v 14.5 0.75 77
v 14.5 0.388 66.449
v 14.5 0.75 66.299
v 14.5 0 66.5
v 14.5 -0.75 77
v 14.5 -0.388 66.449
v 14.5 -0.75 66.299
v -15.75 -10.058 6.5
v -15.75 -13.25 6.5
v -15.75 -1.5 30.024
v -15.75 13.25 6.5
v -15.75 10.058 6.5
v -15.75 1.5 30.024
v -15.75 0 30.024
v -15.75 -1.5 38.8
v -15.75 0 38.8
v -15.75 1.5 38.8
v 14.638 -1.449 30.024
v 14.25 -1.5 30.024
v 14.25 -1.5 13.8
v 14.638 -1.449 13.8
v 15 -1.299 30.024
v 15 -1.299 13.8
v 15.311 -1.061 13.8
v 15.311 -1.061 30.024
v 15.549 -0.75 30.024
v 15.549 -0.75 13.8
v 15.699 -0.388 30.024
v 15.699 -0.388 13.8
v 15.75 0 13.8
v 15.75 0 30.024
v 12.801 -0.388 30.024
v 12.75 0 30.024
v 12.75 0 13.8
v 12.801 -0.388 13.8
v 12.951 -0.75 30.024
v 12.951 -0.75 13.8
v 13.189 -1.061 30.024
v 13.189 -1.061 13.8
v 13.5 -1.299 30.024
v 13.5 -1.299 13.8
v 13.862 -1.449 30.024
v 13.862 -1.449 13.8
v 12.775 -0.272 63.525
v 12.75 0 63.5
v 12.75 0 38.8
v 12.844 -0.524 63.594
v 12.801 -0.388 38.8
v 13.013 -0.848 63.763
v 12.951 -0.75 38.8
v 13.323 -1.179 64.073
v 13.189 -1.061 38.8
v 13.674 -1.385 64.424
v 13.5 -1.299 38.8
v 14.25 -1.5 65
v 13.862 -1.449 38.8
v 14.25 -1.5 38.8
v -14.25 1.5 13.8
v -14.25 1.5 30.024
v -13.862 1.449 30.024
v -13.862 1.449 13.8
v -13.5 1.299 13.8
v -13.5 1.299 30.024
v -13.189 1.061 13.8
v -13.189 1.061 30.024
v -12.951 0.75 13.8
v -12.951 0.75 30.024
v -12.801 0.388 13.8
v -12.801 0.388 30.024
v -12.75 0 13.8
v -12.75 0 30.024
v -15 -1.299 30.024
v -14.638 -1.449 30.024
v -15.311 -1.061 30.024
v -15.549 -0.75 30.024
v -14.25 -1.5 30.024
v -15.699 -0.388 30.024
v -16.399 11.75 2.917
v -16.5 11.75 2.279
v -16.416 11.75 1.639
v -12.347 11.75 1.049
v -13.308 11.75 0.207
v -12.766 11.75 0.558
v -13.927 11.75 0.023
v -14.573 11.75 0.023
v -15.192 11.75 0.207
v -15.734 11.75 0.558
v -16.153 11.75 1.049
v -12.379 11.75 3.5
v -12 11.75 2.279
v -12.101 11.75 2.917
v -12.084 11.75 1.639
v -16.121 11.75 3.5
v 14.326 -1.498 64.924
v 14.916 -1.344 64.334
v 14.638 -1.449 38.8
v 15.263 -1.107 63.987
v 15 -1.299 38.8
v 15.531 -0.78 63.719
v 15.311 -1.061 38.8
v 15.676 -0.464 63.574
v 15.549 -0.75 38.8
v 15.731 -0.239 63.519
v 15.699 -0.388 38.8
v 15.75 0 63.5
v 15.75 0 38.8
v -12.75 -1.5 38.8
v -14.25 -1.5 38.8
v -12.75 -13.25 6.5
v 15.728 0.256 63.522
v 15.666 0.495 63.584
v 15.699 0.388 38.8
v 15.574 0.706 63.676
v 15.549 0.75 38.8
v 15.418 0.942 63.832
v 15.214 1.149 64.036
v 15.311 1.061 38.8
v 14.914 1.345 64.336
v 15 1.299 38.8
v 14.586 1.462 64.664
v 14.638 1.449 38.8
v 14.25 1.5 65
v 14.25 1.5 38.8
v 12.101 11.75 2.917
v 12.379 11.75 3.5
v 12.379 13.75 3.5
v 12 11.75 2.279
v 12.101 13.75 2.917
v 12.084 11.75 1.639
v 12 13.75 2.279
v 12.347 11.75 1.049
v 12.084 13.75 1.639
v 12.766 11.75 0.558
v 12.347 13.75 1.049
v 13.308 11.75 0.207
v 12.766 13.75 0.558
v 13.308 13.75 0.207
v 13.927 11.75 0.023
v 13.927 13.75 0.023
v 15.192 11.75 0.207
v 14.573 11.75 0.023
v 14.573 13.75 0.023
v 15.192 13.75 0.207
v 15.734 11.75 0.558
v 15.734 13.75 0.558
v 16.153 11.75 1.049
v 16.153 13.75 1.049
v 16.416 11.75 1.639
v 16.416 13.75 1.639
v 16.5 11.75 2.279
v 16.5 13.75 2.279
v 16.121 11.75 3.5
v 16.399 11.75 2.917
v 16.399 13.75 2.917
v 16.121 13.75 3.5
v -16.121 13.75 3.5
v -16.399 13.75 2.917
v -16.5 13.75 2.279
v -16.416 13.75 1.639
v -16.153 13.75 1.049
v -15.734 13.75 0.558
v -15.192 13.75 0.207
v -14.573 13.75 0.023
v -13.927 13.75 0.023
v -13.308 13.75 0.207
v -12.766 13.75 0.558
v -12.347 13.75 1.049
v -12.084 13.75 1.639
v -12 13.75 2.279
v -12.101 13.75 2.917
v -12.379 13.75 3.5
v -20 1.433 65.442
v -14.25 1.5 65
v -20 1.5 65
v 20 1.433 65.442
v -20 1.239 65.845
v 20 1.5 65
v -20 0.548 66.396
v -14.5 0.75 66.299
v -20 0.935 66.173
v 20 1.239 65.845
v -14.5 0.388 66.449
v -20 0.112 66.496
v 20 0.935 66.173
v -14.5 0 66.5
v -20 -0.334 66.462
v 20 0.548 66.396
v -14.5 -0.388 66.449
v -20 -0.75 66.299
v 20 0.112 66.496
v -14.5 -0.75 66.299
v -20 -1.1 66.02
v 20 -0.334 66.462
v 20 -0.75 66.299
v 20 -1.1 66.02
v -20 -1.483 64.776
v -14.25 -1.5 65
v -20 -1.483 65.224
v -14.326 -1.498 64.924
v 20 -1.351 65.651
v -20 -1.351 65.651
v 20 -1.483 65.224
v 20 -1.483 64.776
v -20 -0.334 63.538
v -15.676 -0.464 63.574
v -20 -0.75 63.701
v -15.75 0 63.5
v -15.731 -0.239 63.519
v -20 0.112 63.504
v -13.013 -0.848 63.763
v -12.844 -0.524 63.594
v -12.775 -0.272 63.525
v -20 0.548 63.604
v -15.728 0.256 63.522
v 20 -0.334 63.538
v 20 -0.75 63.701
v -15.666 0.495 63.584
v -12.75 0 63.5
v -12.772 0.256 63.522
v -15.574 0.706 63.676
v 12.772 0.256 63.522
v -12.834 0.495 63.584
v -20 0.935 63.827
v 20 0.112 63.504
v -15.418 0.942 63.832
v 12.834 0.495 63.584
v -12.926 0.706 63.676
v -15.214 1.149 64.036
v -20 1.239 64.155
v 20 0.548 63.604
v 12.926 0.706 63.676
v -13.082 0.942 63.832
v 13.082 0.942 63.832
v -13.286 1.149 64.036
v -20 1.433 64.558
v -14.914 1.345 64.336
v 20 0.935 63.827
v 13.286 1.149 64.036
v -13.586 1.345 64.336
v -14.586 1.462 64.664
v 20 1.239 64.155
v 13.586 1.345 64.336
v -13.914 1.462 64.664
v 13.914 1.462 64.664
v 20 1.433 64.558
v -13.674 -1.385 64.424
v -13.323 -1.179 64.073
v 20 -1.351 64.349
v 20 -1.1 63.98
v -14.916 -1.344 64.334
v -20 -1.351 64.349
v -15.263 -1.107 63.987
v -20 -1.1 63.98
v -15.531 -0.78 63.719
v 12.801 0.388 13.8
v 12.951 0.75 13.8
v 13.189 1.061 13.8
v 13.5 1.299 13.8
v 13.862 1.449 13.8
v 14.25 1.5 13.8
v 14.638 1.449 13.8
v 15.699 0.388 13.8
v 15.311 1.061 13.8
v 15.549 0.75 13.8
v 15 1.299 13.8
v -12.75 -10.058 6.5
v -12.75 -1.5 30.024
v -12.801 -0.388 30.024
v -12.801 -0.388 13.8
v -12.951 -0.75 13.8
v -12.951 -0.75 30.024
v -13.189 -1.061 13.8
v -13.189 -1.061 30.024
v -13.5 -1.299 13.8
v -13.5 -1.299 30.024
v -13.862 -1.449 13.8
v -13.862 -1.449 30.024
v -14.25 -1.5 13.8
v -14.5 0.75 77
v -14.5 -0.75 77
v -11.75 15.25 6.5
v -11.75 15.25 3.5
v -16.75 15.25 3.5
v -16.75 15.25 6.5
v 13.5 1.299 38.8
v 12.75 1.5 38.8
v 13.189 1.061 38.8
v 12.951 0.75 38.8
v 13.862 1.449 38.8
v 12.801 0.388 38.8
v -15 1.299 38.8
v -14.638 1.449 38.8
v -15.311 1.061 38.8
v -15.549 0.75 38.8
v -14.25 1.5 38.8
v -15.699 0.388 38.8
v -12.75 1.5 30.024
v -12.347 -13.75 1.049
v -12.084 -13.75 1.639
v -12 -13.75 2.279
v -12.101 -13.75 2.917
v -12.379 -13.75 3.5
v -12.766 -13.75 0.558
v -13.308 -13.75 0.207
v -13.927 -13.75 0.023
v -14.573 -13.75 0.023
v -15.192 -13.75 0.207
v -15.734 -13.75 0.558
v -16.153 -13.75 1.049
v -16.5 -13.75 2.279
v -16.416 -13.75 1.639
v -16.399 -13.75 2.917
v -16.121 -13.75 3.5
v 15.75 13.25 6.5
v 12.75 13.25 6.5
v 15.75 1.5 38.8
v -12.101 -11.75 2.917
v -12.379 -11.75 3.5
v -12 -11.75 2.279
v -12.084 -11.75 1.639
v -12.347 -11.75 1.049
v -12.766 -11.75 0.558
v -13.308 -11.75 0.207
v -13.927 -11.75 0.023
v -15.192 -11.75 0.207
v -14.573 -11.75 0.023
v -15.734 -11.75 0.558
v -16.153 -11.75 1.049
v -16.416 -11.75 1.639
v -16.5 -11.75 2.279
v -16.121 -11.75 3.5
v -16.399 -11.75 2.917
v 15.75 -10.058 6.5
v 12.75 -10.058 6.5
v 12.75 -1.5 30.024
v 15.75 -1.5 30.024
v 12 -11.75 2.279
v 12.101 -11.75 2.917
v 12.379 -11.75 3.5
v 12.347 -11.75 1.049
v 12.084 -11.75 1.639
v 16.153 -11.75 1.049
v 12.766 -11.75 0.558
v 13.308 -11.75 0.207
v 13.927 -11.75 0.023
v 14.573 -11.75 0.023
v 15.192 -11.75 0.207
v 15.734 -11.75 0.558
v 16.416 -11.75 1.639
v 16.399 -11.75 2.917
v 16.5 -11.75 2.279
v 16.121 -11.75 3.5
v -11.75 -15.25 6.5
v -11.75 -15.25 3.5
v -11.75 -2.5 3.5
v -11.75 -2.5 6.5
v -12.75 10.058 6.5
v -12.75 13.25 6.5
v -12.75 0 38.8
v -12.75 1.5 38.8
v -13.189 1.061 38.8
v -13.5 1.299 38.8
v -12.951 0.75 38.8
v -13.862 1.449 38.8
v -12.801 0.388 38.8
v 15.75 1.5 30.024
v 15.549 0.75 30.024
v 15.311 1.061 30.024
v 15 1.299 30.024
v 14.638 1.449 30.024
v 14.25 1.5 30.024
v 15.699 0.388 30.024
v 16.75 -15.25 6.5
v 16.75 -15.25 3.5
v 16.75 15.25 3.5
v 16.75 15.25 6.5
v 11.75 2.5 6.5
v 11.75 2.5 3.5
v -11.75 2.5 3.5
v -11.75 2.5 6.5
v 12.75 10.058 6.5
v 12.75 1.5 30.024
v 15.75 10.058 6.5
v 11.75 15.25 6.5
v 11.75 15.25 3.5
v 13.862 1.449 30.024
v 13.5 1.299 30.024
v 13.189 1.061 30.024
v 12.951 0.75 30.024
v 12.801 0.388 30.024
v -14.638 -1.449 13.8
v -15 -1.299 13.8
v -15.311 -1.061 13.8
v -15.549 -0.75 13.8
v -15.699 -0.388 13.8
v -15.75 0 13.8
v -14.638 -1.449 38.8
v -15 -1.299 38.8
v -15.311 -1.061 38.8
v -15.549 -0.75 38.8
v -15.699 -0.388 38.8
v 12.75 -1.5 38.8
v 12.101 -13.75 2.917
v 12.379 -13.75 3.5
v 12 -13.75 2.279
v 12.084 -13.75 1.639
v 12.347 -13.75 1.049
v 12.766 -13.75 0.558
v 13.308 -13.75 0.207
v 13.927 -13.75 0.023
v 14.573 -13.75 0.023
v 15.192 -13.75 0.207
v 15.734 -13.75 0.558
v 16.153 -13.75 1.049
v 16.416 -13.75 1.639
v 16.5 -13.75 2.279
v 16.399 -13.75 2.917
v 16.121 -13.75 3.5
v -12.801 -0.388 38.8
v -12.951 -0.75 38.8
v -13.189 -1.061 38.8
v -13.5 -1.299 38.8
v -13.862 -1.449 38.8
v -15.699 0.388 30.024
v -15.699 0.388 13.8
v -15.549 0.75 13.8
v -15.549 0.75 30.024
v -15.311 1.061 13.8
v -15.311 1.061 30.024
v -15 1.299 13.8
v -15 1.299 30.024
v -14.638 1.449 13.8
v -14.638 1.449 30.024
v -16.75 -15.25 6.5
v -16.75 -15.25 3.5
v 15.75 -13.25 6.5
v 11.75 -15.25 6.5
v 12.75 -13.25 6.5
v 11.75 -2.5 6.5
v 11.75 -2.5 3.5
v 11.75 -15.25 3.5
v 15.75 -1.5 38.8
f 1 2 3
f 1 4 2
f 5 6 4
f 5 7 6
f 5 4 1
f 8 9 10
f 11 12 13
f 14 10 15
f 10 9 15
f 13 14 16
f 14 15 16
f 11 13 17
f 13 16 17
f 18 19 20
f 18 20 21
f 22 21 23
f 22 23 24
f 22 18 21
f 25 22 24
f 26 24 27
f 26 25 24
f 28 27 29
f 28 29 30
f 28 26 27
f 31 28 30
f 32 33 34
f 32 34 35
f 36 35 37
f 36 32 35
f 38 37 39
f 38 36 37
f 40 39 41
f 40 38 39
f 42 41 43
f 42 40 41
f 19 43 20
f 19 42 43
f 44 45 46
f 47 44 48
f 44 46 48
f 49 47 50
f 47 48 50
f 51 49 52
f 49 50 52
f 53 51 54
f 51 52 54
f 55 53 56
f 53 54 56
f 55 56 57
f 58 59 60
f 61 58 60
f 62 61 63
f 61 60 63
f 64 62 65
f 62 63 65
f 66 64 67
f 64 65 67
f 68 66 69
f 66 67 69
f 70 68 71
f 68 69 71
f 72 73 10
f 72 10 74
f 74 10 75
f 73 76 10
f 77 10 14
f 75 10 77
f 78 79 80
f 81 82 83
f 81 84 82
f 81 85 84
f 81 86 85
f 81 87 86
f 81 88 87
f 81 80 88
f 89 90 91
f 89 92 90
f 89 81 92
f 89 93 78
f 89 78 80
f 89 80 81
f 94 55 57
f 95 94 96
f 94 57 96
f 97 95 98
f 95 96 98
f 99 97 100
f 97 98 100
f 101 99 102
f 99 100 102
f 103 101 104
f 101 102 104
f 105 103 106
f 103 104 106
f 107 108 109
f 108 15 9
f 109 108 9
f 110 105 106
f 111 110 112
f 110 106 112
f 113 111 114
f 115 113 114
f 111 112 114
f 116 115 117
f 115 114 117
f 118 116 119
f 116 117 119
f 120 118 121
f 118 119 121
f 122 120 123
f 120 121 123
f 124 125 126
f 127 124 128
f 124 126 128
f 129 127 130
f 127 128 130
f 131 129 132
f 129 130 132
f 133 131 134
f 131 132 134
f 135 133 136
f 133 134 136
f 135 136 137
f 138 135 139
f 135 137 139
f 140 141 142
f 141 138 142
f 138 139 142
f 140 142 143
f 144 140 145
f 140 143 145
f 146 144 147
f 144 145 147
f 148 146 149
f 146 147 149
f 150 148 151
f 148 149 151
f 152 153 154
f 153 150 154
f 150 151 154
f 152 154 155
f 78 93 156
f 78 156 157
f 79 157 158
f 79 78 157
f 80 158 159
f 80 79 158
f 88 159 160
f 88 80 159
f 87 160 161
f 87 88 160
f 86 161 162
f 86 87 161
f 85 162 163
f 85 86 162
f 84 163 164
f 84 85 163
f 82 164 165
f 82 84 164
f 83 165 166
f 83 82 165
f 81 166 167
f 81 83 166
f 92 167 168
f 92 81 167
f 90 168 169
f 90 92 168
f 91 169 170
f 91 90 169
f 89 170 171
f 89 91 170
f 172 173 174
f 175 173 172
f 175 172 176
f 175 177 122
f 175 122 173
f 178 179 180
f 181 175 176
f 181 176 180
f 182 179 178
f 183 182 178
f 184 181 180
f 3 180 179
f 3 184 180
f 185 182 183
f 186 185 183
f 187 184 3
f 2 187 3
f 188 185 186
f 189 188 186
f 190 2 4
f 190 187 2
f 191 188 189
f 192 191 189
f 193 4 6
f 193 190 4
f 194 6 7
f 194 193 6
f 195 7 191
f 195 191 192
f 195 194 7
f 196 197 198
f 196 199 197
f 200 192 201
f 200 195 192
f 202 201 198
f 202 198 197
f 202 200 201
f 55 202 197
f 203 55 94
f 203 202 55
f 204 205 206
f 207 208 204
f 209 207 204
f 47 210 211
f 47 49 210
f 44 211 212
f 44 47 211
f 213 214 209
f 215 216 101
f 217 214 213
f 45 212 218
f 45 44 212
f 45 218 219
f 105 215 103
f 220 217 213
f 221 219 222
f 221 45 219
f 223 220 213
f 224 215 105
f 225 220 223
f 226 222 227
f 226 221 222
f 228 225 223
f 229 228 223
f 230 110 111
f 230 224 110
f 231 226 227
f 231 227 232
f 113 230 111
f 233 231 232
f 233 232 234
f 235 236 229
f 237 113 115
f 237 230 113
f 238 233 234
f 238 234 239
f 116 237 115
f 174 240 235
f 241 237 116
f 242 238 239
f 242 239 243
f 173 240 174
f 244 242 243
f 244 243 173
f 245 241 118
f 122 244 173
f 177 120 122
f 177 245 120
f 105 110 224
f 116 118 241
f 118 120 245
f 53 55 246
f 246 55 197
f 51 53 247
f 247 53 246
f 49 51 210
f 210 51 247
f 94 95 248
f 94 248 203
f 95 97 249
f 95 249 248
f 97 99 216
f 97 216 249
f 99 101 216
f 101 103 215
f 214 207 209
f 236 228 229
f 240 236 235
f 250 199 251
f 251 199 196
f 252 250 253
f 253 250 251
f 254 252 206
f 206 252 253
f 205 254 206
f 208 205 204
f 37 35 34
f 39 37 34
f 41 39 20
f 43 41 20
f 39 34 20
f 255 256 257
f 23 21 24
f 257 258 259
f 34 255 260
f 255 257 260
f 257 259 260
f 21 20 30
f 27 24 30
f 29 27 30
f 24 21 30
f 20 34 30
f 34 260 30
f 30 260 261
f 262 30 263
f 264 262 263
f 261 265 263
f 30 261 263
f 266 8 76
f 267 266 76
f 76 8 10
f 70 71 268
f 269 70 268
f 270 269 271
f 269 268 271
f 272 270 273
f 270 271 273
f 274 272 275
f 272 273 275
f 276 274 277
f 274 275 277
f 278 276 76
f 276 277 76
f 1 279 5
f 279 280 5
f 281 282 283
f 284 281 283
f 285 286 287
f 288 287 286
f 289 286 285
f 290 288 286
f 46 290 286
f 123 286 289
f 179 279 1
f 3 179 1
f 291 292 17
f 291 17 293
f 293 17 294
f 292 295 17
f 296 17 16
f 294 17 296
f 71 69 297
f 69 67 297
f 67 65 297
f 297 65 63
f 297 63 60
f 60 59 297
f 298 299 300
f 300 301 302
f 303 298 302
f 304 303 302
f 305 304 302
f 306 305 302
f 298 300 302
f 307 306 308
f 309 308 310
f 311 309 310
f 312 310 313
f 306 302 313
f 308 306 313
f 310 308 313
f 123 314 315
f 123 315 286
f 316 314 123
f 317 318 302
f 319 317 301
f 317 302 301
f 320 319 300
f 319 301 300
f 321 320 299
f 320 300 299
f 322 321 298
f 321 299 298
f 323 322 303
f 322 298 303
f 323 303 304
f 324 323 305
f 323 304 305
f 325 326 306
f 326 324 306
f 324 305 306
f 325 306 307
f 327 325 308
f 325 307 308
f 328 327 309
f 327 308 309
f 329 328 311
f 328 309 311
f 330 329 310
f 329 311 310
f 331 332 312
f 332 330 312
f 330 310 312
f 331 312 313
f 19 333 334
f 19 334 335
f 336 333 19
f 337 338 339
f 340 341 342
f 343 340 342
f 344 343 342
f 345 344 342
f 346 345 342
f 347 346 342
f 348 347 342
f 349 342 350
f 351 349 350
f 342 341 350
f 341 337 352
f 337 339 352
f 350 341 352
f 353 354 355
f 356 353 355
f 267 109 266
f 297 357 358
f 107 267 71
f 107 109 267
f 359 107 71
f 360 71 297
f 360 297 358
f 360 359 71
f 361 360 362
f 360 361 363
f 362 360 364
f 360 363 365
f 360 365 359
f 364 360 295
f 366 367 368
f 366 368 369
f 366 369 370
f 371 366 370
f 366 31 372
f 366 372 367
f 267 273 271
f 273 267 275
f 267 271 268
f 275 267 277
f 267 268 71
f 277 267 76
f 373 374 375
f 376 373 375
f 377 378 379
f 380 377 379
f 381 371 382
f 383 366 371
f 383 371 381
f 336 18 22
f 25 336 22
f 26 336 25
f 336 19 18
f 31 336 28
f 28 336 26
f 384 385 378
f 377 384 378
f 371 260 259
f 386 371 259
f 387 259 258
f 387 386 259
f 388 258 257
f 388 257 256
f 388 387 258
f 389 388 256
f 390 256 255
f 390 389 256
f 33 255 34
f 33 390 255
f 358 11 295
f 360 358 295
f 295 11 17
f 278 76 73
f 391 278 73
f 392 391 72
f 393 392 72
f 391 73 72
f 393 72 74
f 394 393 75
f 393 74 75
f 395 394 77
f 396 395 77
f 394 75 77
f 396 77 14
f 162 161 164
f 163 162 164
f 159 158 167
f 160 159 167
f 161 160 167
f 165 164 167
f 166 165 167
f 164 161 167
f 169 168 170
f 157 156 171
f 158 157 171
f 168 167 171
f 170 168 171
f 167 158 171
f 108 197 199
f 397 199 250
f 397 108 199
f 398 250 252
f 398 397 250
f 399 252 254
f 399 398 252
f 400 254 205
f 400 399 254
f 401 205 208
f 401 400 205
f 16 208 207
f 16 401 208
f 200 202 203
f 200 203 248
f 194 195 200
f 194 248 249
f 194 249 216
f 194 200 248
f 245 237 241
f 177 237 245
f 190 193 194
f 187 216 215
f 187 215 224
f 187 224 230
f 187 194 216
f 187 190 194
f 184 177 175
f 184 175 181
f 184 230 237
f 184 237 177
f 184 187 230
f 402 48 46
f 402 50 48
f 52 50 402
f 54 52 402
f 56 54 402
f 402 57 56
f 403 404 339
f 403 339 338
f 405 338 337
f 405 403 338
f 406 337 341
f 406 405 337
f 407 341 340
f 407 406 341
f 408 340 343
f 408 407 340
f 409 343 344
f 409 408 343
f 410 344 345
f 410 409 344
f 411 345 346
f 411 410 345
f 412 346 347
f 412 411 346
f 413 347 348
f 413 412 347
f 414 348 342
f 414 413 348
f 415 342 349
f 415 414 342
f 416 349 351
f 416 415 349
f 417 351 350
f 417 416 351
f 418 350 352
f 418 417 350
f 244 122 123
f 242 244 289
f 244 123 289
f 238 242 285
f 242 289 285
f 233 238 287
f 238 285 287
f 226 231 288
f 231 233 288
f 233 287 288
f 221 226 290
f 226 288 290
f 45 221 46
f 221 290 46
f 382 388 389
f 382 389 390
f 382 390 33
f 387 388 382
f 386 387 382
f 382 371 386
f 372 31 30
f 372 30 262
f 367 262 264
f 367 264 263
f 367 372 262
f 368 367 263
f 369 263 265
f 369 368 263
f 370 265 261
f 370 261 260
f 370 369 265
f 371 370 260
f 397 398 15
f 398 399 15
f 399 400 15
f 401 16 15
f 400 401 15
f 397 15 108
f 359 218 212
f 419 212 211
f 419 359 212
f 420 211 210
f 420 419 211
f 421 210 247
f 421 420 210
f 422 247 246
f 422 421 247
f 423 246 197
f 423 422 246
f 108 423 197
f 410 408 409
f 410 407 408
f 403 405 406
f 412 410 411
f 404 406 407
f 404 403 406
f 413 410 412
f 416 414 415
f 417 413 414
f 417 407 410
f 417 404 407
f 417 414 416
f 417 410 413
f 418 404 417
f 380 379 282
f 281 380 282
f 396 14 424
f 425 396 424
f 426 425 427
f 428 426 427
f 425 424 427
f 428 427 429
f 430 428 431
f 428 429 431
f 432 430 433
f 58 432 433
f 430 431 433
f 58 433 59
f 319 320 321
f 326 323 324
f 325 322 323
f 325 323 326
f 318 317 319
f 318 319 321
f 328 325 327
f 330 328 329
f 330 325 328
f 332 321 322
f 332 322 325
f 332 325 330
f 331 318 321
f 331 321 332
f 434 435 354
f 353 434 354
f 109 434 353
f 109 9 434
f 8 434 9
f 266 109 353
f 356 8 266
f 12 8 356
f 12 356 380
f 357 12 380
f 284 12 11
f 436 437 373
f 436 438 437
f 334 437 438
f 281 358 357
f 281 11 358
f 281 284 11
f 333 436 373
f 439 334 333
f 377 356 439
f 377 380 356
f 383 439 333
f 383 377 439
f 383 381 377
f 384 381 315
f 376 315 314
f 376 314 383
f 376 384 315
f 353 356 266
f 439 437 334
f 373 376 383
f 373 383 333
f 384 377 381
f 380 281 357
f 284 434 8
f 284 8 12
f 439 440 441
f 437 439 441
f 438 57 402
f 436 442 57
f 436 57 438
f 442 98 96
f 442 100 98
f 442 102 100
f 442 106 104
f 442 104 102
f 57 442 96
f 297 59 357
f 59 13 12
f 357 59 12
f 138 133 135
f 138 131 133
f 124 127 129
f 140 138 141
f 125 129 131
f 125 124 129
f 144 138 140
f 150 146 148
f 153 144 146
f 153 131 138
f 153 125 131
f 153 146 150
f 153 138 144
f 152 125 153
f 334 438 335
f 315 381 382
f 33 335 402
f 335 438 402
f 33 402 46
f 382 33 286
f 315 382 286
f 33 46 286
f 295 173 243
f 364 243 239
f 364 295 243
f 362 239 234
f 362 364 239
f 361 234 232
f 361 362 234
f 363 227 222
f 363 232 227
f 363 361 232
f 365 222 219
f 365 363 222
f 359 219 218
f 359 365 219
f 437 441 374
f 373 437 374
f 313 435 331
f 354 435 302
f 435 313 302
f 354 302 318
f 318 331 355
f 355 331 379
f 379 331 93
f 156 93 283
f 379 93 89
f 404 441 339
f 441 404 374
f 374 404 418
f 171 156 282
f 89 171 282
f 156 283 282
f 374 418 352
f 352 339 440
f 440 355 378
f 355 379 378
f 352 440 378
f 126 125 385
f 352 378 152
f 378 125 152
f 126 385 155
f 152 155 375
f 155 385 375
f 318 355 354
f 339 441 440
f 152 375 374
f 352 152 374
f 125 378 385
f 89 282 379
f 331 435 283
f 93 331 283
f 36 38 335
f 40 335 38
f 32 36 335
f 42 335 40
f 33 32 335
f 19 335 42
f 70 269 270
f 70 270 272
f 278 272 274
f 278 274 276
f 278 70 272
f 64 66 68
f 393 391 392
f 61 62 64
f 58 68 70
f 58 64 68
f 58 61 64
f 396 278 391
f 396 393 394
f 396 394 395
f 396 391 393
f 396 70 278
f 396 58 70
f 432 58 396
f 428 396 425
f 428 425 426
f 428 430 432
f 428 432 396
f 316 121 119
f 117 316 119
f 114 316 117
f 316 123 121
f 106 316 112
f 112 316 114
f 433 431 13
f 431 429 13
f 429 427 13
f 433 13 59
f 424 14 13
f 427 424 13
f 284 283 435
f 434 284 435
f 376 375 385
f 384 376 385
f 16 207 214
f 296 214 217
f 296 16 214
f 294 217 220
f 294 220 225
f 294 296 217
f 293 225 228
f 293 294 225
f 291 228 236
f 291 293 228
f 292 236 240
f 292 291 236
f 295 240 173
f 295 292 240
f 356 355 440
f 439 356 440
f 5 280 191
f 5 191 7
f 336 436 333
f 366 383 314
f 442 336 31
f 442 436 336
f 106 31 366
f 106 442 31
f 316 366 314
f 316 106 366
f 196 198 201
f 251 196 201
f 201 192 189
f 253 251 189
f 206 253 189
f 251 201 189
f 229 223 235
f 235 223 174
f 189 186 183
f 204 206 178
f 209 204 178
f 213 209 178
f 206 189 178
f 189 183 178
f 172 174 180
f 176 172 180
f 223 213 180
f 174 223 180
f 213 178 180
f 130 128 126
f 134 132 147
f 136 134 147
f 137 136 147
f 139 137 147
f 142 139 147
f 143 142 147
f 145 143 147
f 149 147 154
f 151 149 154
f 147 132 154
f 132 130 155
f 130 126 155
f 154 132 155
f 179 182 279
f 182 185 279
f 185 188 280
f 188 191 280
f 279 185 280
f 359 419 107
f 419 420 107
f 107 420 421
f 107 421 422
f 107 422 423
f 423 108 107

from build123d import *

# Parameters (mm, degrees)
F2_DEPTH          = 3
F6_DEPTH          = 1.5
F9_DEPTH          = 26.2
F9_DEPTH_BACK     = 25
F10_R             = 1.5
F11_DEPTH         = 20
F13_R             = 2.25
F14_DEPTH         = 2
F14_COPIES2_COUNT = 2
F14_COPIES2_PITCH = 38.242646
F15_W             = 29
F15_H             = 11
F16_DEPTH         = 0.75


# Not quite as in the source:
# - a pattern or mirror of a feature is missing from the dataset's text; its kind, count and spacing are read off the source's solid


with BuildPart() as f2:
    # F1 (on offset) → F2 (new body)
    with BuildSketch(Plane.XY.offset(3.5)):
        Polygon((-11.75, -15.25), (-11.75, -2.5), (-11.75, 2.5), (-11.75, 15.25), (-16.75, 15.25), (-16.75, 0), (-16.75, -15.25), align=None)
        Polygon((0, -2.5), (11.75, -2.5), (11.75, 2.5), (0, 2.5), (-11.75, 2.5), (-11.75, -2.5), align=None)
        Polygon((16.75, -15.25), (16.75, 0), (16.75, 15.25), (11.75, 15.25), (11.75, 2.5), (11.75, -2.5), (11.75, -15.25), align=None)
    extrude(amount=F2_DEPTH)

    # F5 (on plane+point) → F6 (join, symmetric)
    with BuildSketch(Plane.YZ.offset(14.25)):
        Polygon((10.057664814, 6.5), (13.25, 6.5), (1.5, 38.8), (0, 38.8), (-1.5, 38.8), (-13.25, 6.5), (-10.057664814, 6.5), (-1.5, 30.0244743399), (0, 30.0244743399), (1.5, 30.0244743399), align=None)
    f6 = extrude(amount=F6_DEPTH, both=True)

    # F6_copies: F6 across plane
    add(f6.mirror(Plane(origin=(0, 0, 0), x_dir=(0, 0, -1), z_dir=(-1, 0, 0))))

    # F8 (on face) → F9 (join, two sides)
    with BuildSketch(Plane.XY.offset(38.8)) as f9_sk:
        with BuildLine():
            ThreePointArc((14.25, -1.5), (15.3106601718, -1.0606601718), (15.75, 0))
            ThreePointArc((15.75, 0), (15.3106601718, 1.0606601718), (14.25, 1.5))
            ThreePointArc((14.25, 1.5), (13.1893398223, 1.0606601659), (12.75, -1.67e-08))
            ThreePointArc((12.75, -1.67e-08), (13.1893398341, -1.0606601777), (14.25, -1.5))
        make_face()
    f9 = extrude(amount=F9_DEPTH) + extrude(f9_sk.sketch, amount=-F9_DEPTH_BACK)

    # F9_copies: F9 across plane
    add(f9.mirror(Plane(origin=(0, 0, 0), x_dir=(0, 0, -1), z_dir=(-1, 0, 0))))

    # F10 (on Right) → F11 (join, symmetric)
    with BuildSketch(Plane.YZ):
        with Locations((0, 65)):
            Circle(F10_R)
    extrude(amount=F11_DEPTH, both=True)

    # F13 (on offset) → F14 (join)
    with BuildSketch(Plane.XZ.offset(13.75)):
        with Locations((14.25, 2.25)):
            Circle(F13_R)
    f14 = extrude(amount=-F14_DEPTH)

    # F14_copies: F14 across plane
    add(f14.mirror(Plane.ZX))

    # F14_copies1: F14 across plane
    add(f14.mirror(Plane(origin=(0, 0, 0), x_dir=(0, 0, -1), z_dir=(-1, 0, 0))))

    # F14_copies2: F14 ×2
    with Locations(*[Vector(-0.7452413135, 0.6667948595, 0) * (i * F14_COPIES2_PITCH) for i in range(1, F14_COPIES2_COUNT)]):
        add(f14)

    # F15 (on Front) → F16 (join, symmetric)
    with BuildSketch(Plane.XZ):
        with Locations((0, 71.5)):
            Rectangle(F15_W, F15_H)
    extrude(amount=F16_DEPTH, both=True)


solid = f2.part
